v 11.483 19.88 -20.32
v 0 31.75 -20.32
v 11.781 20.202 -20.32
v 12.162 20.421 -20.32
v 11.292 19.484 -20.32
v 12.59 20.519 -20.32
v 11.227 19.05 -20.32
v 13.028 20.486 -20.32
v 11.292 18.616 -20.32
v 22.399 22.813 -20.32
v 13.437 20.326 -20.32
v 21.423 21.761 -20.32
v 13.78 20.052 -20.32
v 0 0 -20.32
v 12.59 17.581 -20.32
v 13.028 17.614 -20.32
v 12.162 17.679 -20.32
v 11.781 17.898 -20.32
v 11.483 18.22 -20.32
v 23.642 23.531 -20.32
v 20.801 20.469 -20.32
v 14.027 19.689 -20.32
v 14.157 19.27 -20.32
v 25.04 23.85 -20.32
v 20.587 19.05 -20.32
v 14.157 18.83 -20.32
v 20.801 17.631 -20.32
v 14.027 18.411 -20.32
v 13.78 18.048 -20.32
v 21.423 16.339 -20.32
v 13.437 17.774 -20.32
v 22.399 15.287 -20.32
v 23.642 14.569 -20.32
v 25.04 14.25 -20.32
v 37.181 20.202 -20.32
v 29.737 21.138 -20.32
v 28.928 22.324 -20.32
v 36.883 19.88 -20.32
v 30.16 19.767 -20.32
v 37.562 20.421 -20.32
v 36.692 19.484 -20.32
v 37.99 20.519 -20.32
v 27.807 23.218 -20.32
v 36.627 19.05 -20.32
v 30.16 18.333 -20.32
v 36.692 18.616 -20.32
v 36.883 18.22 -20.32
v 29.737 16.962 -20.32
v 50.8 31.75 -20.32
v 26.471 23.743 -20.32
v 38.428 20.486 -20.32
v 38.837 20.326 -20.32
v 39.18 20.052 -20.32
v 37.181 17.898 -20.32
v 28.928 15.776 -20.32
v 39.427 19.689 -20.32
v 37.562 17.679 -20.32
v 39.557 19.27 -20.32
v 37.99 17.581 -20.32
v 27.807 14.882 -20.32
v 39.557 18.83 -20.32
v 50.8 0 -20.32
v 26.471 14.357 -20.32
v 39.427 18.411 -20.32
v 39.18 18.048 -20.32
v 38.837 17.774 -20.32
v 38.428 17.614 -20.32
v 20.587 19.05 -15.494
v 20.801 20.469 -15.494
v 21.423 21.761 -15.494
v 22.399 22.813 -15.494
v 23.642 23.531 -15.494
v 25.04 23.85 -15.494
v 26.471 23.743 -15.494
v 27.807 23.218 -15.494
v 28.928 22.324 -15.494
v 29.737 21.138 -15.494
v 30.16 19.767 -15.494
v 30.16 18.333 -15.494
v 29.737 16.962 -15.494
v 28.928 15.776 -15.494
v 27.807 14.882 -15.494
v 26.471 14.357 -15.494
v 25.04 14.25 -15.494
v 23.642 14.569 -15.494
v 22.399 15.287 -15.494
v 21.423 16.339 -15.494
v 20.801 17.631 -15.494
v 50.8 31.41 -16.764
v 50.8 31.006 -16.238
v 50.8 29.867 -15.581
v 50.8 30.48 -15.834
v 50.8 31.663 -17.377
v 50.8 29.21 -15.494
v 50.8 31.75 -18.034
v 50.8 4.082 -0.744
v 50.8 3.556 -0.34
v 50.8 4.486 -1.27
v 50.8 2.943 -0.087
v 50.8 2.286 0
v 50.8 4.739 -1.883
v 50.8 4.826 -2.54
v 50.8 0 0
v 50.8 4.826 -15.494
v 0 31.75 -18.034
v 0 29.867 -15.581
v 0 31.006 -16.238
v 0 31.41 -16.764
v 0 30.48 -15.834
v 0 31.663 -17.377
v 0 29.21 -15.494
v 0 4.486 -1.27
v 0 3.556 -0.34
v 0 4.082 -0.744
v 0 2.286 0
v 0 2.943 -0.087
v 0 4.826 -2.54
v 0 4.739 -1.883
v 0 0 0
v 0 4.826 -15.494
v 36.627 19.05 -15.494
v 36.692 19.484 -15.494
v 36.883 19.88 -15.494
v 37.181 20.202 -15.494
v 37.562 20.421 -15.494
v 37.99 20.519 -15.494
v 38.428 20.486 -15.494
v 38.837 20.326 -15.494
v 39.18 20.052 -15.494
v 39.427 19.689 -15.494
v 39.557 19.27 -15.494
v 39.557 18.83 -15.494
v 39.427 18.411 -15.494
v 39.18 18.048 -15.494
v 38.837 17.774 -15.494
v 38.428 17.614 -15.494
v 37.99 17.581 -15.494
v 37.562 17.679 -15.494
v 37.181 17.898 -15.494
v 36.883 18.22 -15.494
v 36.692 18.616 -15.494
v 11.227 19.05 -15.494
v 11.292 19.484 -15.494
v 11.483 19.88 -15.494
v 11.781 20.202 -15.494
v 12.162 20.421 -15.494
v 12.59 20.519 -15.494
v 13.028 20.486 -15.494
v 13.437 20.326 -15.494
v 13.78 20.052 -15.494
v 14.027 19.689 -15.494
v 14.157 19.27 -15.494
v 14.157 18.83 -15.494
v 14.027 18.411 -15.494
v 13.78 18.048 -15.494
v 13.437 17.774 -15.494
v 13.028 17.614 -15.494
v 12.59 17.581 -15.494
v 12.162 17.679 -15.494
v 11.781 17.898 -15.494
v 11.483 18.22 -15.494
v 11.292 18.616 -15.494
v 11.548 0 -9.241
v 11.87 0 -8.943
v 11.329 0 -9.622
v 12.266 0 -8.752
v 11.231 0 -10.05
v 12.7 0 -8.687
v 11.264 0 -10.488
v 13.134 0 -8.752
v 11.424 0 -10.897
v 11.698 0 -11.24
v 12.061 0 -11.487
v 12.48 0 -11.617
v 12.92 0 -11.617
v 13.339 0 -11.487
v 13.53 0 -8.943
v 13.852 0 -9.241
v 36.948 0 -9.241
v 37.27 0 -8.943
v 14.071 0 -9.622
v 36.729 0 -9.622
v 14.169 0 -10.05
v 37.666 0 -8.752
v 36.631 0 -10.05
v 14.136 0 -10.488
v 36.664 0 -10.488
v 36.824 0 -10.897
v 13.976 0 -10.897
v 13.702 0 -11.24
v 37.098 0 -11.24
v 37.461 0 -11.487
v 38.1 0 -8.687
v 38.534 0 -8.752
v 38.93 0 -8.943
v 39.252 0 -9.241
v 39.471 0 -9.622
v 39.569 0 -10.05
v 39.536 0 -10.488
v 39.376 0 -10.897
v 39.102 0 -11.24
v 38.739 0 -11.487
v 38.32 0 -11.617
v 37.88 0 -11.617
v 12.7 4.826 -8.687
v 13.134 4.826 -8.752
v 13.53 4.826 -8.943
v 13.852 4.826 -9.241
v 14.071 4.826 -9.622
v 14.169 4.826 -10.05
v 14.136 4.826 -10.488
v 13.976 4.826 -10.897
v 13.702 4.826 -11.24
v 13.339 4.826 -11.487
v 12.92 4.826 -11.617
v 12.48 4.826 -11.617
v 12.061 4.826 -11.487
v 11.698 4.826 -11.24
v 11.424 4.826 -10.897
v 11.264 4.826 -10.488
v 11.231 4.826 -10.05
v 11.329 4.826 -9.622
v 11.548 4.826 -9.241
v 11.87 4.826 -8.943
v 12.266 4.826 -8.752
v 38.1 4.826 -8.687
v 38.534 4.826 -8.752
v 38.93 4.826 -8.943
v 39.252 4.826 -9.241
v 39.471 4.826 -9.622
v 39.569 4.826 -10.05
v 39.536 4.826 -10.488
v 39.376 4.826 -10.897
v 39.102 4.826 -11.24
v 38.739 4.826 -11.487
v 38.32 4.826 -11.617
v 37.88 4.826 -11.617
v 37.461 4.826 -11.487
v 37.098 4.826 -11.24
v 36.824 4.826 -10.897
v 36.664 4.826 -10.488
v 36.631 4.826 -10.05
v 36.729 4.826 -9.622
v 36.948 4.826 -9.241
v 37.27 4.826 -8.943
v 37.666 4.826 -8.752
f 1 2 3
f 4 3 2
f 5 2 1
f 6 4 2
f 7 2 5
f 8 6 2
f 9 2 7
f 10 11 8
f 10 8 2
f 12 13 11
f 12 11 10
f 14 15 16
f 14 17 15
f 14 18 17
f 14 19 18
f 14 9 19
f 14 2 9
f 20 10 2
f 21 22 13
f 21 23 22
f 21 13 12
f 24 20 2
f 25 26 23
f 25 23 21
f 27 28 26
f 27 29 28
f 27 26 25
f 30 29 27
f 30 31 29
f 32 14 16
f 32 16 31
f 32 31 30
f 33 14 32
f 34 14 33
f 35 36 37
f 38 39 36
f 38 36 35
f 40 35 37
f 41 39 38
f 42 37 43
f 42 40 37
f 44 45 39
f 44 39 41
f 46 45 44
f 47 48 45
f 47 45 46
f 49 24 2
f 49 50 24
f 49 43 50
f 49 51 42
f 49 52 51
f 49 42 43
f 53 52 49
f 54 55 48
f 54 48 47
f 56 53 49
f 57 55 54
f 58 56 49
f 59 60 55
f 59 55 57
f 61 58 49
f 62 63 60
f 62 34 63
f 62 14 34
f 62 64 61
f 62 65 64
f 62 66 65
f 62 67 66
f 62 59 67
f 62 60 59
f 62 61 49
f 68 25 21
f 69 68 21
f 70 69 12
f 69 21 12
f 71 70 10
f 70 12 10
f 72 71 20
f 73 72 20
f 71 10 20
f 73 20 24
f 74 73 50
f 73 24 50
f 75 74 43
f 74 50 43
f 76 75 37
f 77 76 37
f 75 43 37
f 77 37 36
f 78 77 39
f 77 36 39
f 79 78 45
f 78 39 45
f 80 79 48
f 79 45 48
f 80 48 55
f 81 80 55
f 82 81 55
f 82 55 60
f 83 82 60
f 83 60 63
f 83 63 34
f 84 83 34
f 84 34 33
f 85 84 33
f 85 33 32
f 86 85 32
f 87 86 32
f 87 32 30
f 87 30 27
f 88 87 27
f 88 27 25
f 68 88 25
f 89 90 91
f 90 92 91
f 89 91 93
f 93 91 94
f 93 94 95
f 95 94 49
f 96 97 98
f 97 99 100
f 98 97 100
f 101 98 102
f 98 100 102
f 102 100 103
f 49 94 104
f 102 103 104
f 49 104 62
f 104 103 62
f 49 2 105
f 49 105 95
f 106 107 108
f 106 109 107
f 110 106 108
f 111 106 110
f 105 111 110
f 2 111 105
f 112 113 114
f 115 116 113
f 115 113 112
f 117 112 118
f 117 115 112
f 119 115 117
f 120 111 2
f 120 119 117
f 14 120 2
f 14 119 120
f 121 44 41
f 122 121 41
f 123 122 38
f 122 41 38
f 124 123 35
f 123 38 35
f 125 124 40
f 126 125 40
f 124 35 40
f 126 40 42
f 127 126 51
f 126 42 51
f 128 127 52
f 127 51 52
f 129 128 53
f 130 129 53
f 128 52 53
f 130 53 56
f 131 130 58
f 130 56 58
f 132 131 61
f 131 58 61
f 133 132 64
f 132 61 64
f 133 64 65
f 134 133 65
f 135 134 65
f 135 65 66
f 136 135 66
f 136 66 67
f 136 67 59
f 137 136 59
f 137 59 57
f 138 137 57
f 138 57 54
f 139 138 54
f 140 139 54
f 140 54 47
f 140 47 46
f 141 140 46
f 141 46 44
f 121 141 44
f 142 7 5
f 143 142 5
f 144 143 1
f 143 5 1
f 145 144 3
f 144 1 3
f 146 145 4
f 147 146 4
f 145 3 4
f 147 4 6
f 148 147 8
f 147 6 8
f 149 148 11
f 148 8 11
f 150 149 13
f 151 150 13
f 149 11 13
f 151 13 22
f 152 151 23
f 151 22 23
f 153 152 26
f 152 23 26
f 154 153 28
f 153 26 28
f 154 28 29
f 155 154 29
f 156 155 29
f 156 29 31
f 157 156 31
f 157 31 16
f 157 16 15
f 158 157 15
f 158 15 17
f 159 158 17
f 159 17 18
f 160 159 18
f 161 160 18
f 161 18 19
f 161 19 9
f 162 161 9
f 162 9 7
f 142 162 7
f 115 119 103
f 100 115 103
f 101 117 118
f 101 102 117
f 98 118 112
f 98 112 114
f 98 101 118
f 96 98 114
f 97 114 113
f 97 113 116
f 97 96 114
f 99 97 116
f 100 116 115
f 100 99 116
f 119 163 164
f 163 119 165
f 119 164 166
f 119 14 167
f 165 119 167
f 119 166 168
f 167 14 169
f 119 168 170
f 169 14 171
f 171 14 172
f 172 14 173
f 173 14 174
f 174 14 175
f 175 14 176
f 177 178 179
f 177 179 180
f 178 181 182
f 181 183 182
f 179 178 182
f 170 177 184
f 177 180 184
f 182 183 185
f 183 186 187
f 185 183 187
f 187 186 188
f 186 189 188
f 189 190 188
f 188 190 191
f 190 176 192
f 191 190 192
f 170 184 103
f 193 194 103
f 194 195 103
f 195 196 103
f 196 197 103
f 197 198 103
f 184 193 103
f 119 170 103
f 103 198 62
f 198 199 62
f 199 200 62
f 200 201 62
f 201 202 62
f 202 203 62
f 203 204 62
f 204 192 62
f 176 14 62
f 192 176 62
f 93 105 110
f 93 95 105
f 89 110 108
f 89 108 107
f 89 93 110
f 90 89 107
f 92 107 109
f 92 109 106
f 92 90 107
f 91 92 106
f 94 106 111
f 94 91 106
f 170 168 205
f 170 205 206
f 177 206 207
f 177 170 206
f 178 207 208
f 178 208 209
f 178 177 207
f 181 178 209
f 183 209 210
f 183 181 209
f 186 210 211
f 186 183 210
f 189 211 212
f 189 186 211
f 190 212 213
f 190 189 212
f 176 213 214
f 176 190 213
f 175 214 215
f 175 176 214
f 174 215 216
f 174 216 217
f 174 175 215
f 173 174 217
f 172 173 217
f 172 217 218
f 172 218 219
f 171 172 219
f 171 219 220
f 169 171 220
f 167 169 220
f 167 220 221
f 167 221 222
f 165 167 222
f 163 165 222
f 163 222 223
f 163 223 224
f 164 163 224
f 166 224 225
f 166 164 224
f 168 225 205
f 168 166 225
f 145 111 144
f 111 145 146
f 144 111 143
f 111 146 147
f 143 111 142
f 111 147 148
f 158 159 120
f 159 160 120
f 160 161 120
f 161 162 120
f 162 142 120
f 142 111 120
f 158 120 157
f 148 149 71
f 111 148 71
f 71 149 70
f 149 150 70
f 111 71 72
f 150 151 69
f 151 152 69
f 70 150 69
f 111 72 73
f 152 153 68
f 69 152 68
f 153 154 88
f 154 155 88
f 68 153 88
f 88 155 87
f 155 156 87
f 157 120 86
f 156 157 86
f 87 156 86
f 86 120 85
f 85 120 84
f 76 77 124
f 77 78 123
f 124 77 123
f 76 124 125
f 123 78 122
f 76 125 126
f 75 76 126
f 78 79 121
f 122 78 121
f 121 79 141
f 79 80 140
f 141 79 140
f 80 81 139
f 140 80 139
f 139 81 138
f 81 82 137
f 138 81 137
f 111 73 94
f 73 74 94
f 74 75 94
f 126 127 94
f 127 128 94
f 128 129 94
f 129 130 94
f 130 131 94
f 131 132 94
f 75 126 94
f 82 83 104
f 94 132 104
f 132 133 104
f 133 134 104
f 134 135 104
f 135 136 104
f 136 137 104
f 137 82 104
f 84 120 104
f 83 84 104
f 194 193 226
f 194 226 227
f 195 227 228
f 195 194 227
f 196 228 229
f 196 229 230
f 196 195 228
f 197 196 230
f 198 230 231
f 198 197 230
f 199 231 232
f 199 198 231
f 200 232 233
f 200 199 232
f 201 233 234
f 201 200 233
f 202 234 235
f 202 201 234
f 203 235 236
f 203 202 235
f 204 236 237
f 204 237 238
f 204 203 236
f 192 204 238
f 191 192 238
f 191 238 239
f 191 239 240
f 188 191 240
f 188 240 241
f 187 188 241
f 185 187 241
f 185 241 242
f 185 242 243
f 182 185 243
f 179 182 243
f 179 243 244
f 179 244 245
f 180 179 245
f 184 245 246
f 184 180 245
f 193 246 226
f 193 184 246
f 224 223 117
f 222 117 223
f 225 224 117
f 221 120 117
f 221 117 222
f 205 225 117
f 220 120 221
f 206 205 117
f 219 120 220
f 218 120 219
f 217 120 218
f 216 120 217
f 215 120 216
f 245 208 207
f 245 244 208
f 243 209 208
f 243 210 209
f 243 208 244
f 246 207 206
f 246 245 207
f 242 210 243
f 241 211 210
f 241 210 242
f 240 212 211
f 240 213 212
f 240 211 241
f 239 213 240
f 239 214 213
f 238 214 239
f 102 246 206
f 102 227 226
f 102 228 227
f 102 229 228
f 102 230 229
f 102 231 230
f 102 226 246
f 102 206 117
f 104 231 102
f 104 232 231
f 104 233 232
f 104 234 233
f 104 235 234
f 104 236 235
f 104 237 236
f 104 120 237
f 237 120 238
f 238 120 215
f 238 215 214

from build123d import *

# Parameters (mm, degrees)
SKETCH1_W           = 50.8
SKETCH1_H           = 20.32
SKETCH1_R           = 1.4732
BOSS_EXTRUDE1_DEPTH = 4.826
SKETCH2_W           = 50.8
SKETCH2_H           = 4.826
BOSS_EXTRUDE2_DEPTH = 26.924
FILLET1_R           = 2.54
SKETCH3_R           = 1.4732
SKETCH3_R_2         = 4.8133
CUT_EXTRUDE1_DEPTH  = 26.924


with BuildPart() as part:
    # Sketch1 → Boss-Extrude1 (new body)
    with BuildSketch(Plane(origin=(0, 0, 0), x_dir=(1, 0, 0), z_dir=(0, 1, 0))):
        with Locations((25.4, 10.16)):
            Rectangle(SKETCH1_W, SKETCH1_H)
        with Locations(Location((12.7, 10.16, 0), (0, 0, 270))):
            Circle(SKETCH1_R, mode=Mode.SUBTRACT)
        with Locations(Location((38.1, 10.16, 0), (0, 0, 270))):
            Circle(SKETCH1_R, mode=Mode.SUBTRACT)
    extrude(amount=BOSS_EXTRUDE1_DEPTH)

    # Sketch2 → Boss-Extrude2 (add)
    with BuildSketch(Plane(origin=(0, 4.826, 0), x_dir=(1, 0, 0), z_dir=(0, 1, 0))):
        with Locations((25.4, 17.907)):
            Rectangle(SKETCH2_W, SKETCH2_H)
    extrude(amount=BOSS_EXTRUDE2_DEPTH)

    # Fillet1
    fillet1_edges = [part.edges().sort_by_distance(p)[0] for p in [
        (25.4, 31.75, -15.494),
        (25.4, 4.826, 0),
    ]]
    fillet(fillet1_edges, radius=FILLET1_R)

    # Sketch3 → Cut-Extrude1 (cut)
    with BuildSketch(Plane(origin=(0, 0, -20.32), x_dir=(-1, 0, 0), z_dir=(0, 0, -1))):
        with Locations((-38.1, 19.05)):
            Circle(SKETCH3_R)
        with Locations((-12.7, 19.05)):
            Circle(SKETCH3_R)
        with Locations((-25.4, 19.05)):
            Circle(SKETCH3_R_2)
    extrude(amount=-CUT_EXTRUDE1_DEPTH, mode=Mode.SUBTRACT)


solid = part.part
